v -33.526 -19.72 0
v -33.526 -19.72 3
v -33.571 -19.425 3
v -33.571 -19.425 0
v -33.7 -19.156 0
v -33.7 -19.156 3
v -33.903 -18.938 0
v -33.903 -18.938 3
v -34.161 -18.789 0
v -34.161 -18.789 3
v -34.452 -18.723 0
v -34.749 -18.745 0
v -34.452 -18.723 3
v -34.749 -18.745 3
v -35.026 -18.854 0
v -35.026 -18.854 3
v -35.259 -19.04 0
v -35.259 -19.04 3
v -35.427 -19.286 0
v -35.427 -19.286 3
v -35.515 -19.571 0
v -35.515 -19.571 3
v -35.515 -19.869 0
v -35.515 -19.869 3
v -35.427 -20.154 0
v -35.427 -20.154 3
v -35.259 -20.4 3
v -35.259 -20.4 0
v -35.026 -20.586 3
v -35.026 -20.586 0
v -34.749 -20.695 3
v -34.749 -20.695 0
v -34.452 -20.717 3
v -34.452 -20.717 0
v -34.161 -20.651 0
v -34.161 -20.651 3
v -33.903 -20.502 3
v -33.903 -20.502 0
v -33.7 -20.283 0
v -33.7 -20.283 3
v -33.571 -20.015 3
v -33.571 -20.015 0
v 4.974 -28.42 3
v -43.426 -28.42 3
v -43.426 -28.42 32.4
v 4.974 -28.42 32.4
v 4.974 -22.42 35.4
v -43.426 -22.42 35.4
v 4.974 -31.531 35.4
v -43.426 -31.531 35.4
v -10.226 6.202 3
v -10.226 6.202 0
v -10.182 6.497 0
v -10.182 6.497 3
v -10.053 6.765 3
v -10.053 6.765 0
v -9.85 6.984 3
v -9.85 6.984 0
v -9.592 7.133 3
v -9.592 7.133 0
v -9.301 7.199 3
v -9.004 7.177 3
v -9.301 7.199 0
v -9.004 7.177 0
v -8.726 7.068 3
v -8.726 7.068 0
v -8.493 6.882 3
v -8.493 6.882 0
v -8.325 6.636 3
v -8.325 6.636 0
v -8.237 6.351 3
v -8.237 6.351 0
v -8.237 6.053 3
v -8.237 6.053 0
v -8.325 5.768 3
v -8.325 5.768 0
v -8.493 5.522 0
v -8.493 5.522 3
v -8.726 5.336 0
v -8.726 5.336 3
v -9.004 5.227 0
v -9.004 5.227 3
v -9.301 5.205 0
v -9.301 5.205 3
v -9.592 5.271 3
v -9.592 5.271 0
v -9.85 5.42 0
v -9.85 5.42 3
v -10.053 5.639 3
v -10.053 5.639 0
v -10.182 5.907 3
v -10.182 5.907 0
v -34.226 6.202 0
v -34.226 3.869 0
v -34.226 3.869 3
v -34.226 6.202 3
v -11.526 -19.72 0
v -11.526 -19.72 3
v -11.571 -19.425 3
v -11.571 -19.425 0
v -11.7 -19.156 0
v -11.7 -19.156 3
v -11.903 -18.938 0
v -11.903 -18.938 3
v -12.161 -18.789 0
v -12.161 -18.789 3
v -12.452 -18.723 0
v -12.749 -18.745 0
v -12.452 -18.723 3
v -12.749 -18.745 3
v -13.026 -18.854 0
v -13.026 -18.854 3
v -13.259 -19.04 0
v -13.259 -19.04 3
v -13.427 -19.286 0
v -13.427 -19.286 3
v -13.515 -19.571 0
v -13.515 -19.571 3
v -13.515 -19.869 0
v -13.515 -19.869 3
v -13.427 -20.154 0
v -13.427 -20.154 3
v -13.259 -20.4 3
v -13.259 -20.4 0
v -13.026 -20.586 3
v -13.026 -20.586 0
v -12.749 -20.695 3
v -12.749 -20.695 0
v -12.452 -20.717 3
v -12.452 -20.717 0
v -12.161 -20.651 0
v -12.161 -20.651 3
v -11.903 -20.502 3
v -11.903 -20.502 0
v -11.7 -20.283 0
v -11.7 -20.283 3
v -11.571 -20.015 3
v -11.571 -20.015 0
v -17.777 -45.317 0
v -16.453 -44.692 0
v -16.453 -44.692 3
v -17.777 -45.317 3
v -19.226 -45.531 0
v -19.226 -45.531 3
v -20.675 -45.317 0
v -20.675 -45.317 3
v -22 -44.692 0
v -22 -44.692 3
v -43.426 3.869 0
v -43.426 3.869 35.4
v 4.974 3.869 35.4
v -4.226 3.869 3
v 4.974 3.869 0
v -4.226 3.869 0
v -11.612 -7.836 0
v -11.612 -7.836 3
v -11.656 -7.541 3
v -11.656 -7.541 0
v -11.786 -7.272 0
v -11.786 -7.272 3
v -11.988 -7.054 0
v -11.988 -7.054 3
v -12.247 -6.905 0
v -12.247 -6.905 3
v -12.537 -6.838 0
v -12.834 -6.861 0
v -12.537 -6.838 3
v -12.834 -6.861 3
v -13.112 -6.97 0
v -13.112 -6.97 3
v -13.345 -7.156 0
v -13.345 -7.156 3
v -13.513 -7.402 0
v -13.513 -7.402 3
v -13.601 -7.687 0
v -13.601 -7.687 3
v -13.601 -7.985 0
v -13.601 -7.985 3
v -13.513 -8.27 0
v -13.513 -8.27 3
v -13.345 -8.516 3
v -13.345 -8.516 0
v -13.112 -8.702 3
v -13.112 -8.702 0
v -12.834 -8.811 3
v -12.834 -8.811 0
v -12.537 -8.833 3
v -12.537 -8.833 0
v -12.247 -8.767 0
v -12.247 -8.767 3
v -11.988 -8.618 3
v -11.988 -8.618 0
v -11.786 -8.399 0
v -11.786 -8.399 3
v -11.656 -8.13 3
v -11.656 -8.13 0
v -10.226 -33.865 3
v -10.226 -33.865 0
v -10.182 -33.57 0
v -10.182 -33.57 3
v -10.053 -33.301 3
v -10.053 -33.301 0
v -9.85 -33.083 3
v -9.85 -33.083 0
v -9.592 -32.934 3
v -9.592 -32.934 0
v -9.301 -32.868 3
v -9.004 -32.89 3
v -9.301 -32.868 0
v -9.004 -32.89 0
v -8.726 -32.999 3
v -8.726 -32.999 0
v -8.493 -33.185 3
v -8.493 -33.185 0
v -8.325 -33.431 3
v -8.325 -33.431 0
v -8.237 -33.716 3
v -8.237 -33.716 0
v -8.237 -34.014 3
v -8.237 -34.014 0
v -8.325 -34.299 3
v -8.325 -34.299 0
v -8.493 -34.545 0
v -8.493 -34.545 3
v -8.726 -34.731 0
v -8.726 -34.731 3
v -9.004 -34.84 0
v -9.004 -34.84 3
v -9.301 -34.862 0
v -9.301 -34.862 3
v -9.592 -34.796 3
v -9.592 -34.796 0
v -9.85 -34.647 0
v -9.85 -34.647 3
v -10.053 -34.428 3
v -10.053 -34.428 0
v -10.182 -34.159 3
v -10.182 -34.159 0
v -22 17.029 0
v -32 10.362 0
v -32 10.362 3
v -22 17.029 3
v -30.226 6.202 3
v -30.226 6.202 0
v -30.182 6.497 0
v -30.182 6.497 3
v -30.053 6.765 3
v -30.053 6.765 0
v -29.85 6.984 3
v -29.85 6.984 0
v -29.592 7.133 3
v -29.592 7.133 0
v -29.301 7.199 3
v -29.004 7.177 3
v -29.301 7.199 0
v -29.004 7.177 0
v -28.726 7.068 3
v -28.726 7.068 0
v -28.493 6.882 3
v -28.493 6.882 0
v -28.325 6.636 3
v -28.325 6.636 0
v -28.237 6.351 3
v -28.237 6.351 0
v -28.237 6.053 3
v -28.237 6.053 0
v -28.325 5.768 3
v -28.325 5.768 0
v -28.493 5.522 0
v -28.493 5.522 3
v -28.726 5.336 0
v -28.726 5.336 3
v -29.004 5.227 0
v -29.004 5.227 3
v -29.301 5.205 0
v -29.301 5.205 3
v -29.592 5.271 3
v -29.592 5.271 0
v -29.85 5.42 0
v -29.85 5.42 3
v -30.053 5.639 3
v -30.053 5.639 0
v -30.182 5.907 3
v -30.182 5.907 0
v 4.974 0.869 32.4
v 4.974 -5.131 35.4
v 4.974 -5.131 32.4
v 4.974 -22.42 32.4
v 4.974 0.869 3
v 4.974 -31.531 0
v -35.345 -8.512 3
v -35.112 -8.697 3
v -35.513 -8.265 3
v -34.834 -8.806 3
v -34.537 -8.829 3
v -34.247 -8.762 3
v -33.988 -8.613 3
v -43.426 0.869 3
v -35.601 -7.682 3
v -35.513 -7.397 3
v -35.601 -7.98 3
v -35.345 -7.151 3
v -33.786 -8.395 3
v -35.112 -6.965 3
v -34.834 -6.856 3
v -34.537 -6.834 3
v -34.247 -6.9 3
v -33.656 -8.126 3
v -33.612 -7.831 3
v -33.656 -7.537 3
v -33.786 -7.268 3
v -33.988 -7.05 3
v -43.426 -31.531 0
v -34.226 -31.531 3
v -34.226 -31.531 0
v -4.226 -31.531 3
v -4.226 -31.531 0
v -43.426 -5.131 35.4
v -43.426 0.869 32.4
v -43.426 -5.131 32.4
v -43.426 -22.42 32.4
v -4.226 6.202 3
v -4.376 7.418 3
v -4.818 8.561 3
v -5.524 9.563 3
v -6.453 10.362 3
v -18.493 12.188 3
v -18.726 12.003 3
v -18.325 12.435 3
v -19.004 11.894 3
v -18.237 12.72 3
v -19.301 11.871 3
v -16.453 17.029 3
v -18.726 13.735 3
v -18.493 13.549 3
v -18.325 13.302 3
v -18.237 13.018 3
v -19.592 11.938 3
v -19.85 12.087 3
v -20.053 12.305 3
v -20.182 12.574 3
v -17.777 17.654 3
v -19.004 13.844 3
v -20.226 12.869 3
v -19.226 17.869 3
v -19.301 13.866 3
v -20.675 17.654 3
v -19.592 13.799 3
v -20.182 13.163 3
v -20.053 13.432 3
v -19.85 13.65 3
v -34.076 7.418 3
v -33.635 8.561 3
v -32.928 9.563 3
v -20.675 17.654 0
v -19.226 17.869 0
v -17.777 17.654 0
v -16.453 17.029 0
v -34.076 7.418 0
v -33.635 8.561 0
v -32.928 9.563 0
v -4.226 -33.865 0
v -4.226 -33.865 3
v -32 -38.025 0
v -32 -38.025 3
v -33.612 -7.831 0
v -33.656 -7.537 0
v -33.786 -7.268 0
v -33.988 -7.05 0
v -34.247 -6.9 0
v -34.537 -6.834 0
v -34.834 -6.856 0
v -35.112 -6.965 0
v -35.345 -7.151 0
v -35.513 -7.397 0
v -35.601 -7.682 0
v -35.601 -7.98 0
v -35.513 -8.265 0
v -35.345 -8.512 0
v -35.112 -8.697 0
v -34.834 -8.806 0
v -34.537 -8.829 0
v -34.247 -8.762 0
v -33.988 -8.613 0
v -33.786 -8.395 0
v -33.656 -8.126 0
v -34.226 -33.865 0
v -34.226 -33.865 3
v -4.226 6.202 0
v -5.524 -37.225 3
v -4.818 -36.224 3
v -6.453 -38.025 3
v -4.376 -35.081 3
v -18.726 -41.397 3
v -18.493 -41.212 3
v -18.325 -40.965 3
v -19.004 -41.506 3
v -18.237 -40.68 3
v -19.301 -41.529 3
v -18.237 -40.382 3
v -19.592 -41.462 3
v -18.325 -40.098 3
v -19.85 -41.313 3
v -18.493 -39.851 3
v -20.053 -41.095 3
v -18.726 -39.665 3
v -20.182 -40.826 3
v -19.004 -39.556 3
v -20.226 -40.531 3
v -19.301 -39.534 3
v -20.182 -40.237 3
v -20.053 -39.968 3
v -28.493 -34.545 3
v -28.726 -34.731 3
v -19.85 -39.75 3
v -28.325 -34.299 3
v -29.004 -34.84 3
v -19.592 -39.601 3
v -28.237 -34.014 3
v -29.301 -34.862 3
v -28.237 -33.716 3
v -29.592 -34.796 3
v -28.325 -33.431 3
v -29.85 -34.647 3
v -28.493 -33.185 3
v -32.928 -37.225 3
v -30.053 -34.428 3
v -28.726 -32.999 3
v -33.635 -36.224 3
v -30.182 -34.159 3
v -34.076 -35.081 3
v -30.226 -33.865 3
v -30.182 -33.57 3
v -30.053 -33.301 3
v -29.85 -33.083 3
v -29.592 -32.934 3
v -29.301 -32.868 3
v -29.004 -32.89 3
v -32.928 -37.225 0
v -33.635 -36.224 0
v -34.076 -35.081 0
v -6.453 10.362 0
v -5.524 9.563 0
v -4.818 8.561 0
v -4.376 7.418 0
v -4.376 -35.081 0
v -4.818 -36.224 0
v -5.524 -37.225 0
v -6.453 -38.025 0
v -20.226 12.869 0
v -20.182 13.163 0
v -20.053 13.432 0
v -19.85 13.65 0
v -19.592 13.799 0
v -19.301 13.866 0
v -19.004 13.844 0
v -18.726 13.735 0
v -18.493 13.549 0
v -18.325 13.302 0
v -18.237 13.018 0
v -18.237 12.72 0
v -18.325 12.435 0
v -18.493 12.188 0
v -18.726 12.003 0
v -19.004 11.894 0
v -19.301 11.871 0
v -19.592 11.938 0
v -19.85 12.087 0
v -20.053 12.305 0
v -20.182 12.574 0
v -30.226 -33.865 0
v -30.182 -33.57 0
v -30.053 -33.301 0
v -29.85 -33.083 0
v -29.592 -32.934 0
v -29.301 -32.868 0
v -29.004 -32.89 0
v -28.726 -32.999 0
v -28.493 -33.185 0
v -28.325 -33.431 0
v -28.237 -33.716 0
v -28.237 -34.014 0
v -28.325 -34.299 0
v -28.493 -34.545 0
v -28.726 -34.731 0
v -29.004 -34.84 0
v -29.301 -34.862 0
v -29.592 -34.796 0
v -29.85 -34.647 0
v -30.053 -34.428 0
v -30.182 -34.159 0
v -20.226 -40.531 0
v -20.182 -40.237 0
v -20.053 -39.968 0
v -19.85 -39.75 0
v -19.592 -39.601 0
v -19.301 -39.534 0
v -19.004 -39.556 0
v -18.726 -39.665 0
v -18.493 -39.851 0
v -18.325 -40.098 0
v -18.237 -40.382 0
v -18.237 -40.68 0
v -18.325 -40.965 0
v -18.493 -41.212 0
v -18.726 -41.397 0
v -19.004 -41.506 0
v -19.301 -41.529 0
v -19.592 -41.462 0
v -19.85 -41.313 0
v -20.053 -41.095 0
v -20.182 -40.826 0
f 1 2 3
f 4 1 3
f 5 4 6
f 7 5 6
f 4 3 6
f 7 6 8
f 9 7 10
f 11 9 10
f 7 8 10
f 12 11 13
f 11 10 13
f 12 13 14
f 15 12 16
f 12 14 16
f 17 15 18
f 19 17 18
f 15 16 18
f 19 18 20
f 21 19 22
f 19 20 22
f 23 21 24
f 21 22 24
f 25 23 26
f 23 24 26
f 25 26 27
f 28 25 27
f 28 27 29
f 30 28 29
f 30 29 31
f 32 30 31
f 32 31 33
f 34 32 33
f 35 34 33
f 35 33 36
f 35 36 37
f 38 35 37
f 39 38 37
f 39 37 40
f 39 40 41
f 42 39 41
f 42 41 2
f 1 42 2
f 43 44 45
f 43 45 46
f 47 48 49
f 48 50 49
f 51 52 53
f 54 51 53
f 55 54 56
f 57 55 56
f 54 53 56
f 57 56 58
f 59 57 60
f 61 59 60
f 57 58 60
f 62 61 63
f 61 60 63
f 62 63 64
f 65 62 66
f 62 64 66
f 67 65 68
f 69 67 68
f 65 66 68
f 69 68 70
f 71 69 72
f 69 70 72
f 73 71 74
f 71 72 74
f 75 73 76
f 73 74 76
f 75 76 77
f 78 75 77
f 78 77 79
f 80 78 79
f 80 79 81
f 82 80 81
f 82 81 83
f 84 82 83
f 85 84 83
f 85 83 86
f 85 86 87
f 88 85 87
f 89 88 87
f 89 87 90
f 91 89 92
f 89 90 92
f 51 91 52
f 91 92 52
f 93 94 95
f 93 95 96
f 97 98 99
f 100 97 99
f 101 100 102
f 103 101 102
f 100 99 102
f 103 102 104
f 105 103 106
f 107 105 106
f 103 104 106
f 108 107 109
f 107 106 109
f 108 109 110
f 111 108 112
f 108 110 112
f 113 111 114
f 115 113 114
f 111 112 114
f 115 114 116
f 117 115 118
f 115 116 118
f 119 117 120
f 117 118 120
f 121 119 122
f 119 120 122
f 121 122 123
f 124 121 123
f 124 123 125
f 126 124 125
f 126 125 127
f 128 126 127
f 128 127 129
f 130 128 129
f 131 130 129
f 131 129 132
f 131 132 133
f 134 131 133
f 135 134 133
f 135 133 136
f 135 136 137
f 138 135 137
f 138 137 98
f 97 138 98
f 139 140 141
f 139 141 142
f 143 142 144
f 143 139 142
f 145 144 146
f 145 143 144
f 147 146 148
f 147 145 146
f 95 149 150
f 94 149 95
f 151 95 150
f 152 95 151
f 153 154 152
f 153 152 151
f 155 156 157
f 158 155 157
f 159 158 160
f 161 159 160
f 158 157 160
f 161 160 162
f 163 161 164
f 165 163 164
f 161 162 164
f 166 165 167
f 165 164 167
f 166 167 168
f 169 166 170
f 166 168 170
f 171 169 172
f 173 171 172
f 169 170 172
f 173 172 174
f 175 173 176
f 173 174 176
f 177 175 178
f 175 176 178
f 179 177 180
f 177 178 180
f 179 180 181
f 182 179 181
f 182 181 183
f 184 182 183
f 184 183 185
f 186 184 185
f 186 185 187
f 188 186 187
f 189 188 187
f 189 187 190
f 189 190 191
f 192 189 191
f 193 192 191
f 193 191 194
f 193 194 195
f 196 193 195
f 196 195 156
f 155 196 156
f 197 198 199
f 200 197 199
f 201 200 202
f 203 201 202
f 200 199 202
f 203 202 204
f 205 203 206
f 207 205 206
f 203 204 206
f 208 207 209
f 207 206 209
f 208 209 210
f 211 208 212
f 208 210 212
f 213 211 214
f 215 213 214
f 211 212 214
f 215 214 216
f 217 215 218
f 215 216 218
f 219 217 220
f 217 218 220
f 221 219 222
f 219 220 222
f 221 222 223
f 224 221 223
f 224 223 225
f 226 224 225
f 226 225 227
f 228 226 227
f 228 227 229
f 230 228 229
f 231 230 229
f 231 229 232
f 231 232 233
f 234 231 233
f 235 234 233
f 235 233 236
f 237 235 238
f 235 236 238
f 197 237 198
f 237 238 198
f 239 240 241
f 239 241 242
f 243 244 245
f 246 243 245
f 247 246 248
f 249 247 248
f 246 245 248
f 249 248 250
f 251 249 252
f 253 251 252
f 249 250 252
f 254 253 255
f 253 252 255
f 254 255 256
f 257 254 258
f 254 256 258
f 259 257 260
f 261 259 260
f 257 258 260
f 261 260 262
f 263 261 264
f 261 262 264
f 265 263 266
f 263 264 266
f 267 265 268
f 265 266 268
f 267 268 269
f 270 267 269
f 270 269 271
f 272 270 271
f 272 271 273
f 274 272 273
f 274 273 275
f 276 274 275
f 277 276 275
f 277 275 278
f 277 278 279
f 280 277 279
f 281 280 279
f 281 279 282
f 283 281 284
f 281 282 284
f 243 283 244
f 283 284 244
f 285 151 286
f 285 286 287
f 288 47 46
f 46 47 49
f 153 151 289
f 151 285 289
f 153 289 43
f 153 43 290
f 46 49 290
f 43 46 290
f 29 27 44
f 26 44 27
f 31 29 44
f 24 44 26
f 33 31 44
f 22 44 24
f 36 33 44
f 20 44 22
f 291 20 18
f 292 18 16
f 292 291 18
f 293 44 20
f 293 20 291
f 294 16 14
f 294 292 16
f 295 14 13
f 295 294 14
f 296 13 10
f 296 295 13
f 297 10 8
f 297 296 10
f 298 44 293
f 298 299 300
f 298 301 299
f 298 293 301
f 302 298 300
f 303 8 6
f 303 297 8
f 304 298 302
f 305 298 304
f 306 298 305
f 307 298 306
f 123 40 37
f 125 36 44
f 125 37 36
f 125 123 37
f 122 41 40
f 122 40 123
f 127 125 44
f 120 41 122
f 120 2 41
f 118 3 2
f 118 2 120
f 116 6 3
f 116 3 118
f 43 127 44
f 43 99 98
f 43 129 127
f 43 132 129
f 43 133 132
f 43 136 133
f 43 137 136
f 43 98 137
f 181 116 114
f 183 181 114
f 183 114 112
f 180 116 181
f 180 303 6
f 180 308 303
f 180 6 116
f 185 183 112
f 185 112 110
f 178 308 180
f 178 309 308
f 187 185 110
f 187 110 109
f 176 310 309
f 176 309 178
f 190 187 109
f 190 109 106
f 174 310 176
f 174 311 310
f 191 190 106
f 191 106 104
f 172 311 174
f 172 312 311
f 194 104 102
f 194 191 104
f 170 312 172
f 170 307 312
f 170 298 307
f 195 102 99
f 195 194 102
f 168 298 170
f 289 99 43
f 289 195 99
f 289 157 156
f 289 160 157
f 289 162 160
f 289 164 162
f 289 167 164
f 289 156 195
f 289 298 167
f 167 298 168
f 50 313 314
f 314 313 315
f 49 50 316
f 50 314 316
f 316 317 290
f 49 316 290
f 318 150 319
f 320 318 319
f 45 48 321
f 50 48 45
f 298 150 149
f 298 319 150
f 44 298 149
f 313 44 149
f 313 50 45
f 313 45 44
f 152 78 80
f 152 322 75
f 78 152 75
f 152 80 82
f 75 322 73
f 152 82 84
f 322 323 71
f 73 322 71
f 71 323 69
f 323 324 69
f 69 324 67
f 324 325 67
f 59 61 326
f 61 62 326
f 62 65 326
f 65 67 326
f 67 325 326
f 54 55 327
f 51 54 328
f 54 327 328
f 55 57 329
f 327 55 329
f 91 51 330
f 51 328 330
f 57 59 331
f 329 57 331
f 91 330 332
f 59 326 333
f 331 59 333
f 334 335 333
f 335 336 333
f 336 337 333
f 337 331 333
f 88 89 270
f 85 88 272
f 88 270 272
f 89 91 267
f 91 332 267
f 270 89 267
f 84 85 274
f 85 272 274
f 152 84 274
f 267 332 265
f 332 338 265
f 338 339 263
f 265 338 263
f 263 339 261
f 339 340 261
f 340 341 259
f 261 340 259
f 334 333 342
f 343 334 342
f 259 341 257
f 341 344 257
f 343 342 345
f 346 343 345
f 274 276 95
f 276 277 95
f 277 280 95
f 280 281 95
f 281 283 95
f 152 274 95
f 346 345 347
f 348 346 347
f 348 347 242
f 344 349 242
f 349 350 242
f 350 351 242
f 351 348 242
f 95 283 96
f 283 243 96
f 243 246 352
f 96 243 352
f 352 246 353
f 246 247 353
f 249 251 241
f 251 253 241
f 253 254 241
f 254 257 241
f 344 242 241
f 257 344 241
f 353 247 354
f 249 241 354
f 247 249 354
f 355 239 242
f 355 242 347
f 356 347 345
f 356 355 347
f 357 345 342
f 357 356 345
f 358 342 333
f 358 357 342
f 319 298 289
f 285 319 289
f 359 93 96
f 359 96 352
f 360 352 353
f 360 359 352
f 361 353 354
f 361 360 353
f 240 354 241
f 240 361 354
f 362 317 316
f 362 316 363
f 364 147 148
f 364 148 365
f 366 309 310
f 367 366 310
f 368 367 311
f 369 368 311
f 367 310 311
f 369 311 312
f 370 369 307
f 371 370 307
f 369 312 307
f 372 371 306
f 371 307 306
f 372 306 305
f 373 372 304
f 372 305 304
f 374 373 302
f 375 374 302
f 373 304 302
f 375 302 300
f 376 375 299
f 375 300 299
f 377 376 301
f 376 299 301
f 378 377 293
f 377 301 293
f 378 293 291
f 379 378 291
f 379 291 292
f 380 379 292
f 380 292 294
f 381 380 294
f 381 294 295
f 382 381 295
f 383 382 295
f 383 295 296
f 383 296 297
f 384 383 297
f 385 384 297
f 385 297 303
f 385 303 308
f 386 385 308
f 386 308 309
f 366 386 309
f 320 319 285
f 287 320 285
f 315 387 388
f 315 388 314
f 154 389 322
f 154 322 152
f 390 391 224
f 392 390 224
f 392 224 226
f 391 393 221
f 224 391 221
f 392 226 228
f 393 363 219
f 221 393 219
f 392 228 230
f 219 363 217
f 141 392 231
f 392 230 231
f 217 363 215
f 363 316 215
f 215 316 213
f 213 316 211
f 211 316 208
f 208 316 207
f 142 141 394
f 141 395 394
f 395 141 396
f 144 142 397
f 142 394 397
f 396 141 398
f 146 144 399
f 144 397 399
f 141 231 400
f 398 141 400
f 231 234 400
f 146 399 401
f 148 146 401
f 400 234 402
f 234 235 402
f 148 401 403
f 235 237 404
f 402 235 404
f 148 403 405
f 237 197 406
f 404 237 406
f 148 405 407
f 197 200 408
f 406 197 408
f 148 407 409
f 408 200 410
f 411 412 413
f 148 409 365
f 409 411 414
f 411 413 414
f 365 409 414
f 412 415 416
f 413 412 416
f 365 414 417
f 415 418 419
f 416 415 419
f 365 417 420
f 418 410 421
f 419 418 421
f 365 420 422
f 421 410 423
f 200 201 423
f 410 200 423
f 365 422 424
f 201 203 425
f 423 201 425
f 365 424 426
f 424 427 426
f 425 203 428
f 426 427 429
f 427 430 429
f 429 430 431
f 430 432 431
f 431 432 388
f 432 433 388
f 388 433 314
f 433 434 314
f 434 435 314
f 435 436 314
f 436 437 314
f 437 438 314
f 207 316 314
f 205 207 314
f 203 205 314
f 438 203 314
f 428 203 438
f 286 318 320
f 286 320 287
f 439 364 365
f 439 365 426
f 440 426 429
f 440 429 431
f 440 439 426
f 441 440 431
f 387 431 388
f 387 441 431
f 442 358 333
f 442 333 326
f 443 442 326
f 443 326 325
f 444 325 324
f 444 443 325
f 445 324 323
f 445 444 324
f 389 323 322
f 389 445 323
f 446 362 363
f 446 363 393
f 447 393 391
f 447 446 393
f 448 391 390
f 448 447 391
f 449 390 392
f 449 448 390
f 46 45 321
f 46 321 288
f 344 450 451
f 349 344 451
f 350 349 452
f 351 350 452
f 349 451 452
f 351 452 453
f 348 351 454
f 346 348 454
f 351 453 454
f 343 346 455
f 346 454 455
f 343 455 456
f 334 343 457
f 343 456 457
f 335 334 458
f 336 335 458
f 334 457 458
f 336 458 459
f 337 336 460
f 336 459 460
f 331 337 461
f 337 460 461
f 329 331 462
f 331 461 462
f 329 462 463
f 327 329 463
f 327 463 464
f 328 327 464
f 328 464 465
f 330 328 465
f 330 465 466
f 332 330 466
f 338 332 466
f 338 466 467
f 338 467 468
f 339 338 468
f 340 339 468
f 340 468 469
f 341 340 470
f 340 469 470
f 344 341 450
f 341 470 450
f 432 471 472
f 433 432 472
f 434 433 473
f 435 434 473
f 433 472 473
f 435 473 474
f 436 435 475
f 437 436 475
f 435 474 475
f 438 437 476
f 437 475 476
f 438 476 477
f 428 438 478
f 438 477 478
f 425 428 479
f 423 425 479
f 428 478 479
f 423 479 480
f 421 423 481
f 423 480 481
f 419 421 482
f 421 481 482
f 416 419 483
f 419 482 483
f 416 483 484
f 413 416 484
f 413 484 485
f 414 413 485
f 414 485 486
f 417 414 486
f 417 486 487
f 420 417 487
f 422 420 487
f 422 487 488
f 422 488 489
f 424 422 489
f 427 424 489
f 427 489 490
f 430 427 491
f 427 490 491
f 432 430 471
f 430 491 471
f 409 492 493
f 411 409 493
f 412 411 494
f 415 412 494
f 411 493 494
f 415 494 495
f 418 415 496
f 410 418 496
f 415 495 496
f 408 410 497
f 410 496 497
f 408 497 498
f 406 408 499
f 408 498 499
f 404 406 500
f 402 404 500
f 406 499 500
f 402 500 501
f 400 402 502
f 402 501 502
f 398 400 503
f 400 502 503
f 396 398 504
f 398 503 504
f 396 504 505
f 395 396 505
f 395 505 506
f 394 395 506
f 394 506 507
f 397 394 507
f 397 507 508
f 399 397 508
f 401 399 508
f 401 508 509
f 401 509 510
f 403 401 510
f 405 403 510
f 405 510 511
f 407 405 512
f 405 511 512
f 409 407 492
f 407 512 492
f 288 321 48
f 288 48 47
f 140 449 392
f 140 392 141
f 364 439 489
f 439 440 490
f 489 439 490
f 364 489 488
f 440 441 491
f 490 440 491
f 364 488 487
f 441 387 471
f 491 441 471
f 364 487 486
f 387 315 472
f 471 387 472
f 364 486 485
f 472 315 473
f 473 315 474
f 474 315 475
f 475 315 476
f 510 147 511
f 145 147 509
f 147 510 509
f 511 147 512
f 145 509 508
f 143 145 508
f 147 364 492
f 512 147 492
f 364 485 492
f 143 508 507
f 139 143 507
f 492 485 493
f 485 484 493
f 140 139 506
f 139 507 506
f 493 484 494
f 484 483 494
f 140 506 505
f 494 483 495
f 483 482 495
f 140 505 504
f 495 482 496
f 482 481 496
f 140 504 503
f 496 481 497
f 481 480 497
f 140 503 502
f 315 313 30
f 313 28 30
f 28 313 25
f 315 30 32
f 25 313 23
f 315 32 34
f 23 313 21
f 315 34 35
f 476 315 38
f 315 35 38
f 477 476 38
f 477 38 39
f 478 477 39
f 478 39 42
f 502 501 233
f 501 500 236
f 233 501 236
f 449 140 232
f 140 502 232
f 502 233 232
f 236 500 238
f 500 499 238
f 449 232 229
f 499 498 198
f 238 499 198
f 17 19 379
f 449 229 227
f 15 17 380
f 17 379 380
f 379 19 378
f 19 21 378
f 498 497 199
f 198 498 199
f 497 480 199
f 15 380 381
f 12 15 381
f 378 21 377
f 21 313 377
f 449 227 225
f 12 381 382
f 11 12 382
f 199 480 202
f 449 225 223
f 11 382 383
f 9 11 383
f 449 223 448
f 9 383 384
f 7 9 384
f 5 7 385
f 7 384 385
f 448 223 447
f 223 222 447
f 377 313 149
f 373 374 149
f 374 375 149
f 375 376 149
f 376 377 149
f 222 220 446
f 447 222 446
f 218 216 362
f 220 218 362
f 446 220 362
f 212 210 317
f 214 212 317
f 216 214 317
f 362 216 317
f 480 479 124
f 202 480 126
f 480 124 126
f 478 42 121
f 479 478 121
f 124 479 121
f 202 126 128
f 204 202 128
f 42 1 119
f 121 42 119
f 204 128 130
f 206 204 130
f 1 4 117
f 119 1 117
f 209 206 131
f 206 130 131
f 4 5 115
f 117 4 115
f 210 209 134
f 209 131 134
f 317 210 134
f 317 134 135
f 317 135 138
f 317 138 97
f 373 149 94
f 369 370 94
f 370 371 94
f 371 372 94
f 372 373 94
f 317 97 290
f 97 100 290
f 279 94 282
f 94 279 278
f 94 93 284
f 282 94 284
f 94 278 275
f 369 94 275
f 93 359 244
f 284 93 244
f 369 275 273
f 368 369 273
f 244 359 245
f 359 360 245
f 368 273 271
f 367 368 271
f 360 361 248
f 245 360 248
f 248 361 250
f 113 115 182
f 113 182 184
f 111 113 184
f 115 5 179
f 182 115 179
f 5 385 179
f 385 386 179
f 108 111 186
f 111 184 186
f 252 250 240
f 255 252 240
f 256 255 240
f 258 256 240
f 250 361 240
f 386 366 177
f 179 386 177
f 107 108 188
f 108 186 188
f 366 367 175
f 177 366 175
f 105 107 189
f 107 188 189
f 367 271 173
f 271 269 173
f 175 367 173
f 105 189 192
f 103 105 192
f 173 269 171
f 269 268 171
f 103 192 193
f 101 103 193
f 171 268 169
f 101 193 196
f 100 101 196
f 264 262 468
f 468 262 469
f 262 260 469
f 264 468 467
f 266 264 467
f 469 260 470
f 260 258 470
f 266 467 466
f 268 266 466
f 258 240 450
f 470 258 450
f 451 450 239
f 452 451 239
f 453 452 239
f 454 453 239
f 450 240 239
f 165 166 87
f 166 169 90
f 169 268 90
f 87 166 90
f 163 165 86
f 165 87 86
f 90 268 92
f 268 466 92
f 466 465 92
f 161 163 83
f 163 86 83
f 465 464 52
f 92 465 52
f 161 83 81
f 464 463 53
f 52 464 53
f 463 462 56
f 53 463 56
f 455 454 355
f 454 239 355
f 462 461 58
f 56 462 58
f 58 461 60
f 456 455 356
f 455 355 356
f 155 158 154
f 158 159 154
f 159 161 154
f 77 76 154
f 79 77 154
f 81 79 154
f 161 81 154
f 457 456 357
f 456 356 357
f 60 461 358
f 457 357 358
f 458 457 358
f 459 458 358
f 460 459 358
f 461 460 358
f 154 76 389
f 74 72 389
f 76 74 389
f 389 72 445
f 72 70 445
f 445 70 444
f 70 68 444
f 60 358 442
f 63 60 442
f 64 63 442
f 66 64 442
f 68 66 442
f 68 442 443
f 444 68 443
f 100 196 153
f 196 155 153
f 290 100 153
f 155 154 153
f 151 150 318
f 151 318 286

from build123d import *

# Parameters (mm, degrees)
SKETCH4_W                = 48.4
SKETCH4_H                = 35.4
BOTTOM_PLATE_DEPTH       = 3
SKETCH5_W                = 48.4
SKETCH5_H                = 3
SKETCH5_H_2              = 3.111627182
SIDE_PLATE_DEPTH         = 32.4
SKETCH6_W                = 48.4
SKETCH6_H                = 3
TOP_PLATE_1_DEPTH        = 6
SKETCH7_W                = 48.4
SKETCH7_H                = 3
TOP_PLATE_2_DEPTH        = 6
CAMERA_SCREW_HOLES_REACH = 64.688
SKETCH8_R                = 1
SKETCH10_R               = 1
CASE_ATTACHMENT_1_DEPTH  = 3
SKETCH10_4_R             = 1
CASE_ATTACHMENT_2_DEPTH  = 3


with BuildPart() as part:
    # Sketch4 → Bottom_Plate (new body)
    with BuildSketch(Plane.XY):
        with Locations((-19.226323529, -13.831389527)):
            Rectangle(SKETCH4_W, SKETCH4_H)
    extrude(amount=BOTTOM_PLATE_DEPTH)

    # Sketch5 → Side_Plate (add)
    with BuildSketch(Plane.XY.offset(3)):
        with Locations((-19.226323529, 2.368610473)):
            Rectangle(SKETCH5_W, SKETCH5_H)
        with Locations((-19.226323529, -29.975575936)):
            Rectangle(SKETCH5_W, SKETCH5_H_2)
    extrude(amount=SIDE_PLATE_DEPTH)

    # Sketch6 → Top_Plate_1 (add)
    with BuildSketch(Plane.XZ.offset(-0.868610473)):
        with Locations((-19.226323529, 33.9)):
            Rectangle(SKETCH6_W, SKETCH6_H)
    extrude(amount=TOP_PLATE_1_DEPTH)

    # Sketch7 → Top_Plate_2 (add)
    with BuildSketch(Plane(origin=(0, -28.419762345, 0), x_dir=(1, 0, 0), z_dir=(0, 1, 0))):
        with Locations((-19.226323529, -33.9)):
            Rectangle(SKETCH7_W, SKETCH7_H)
    extrude(amount=TOP_PLATE_2_DEPTH)

    # Sketch8 → Camera_Screw_Holes (cut, up to next)
    with BuildSketch(Plane.XY.offset(3), mode=Mode.PRIVATE) as camera_screw_holes_sk1:
        with Locations((-34.526323529, -19.719762345)):
            Circle(SKETCH8_R)
    camera_screw_holes_tool1 = extrude(camera_screw_holes_sk1.sketch, amount=-CAMERA_SCREW_HOLES_REACH, mode=Mode.PRIVATE) & part.part
    # Sketch8 → Camera_Screw_Holes (cut, up to next)
    with BuildSketch(Plane.XY.offset(3), mode=Mode.PRIVATE) as camera_screw_holes_sk2:
        with Locations((-34.611878154, -7.831372789)):
            Circle(SKETCH8_R)
    camera_screw_holes_tool2 = extrude(camera_screw_holes_sk2.sketch, amount=-CAMERA_SCREW_HOLES_REACH, mode=Mode.PRIVATE) & part.part
    # Sketch8 → Camera_Screw_Holes (cut, up to next)
    with BuildSketch(Plane.XY.offset(3), mode=Mode.PRIVATE) as camera_screw_holes_sk3:
        with Locations((-12.611878575, -7.835676936)):
            Circle(SKETCH8_R)
    camera_screw_holes_tool3 = extrude(camera_screw_holes_sk3.sketch, amount=-CAMERA_SCREW_HOLES_REACH, mode=Mode.PRIVATE) & part.part
    # Sketch8 → Camera_Screw_Holes (cut, up to next)
    with BuildSketch(Plane.XY.offset(3), mode=Mode.PRIVATE) as camera_screw_holes_sk4:
        with Locations((-12.526323529, -19.719762345)):
            Circle(SKETCH8_R)
    camera_screw_holes_tool4 = extrude(camera_screw_holes_sk4.sketch, amount=-CAMERA_SCREW_HOLES_REACH, mode=Mode.PRIVATE) & part.part
    add(camera_screw_holes_tool1.solids().sort_by_distance((-34.526324, -19.719762, 3))[0], mode=Mode.SUBTRACT)
    add(camera_screw_holes_tool2.solids().sort_by_distance((-34.611878, -7.831373, 3))[0], mode=Mode.SUBTRACT)
    add(camera_screw_holes_tool3.solids().sort_by_distance((-12.611879, -7.835677, 3))[0], mode=Mode.SUBTRACT)
    add(camera_screw_holes_tool4.solids().sort_by_distance((-12.526324, -19.719762, 3))[0], mode=Mode.SUBTRACT)

    # Sketch10 → Case_Attachment_1 (add)
    with BuildSketch(Plane(origin=(0, 0, 0), x_dir=(-1, 0, 0), z_dir=(0, 0, -1))):
        with BuildLine():
            Line((4.226323529, 6.201943806), (4.226323529, 3.868610473))
            Line((4.226323529, 3.868610473), (34.226323529, 3.868610473))
            Line((34.226323529, 3.868610473), (34.226323529, 6.201943806))
            ThreePointArc((34.226323529, 6.201943806), (33.634696523, 8.561233434), (31.99982451, 10.362195278))
            Line((31.99982451, 10.362195278), (21.99982451, 17.028861945))
            ThreePointArc((21.99982451, 17.028861945), (19.226323529, 17.868610473), (16.452822548, 17.028861945))
            Line((16.452822548, 17.028861945), (6.452822548, 10.362195278))
            ThreePointArc((6.452822548, 10.362195278), (4.817950535, 8.561233434), (4.226323529, 6.201943806))
        make_face()
        with Locations((9.226323529, 6.201943806)):
            Circle(SKETCH10_R, mode=Mode.SUBTRACT)
        with Locations((29.226323529, 6.201943806)):
            Circle(SKETCH10_R, mode=Mode.SUBTRACT)
        with Locations((19.226323529, 12.868610473)):
            Circle(SKETCH10_R, mode=Mode.SUBTRACT)
    extrude(amount=-CASE_ATTACHMENT_1_DEPTH)

    # Sketch10<4> → Case_Attachment_2 (add)
    with BuildSketch(Plane(origin=(0, 0, 0), x_dir=(-1, 0, 0), z_dir=(0, 0, -1))):
        with BuildLine():
            ThreePointArc((4.226323529, -33.86472286), (4.817950535, -36.224012488), (6.452822548, -38.024974332))
            Line((6.452822548, -38.024974332), (16.452822548, -44.691640999))
            ThreePointArc((16.452822548, -44.691640999), (19.226323529, -45.531389527), (21.99982451, -44.691640999))
            Line((21.99982451, -44.691640999), (31.99982451, -38.024974332))
            ThreePointArc((31.99982451, -38.024974332), (33.634696523, -36.224012488), (34.226323529, -33.86472286))
            Line((34.226323529, -33.86472286), (34.226323529, -31.531389527))
            Line((34.226323529, -31.531389527), (4.226323529, -31.531389527))
            Line((4.226323529, -31.531389527), (4.226323529, -33.86472286))
        make_face()
        with Locations((9.226323529, -33.86472286)):
            Circle(SKETCH10_4_R, mode=Mode.SUBTRACT)
        with Locations((19.226323529, -40.531389527)):
            Circle(SKETCH10_4_R, mode=Mode.SUBTRACT)
        with Locations((29.226323529, -33.86472286)):
            Circle(SKETCH10_4_R, mode=Mode.SUBTRACT)
    extrude(amount=-CASE_ATTACHMENT_2_DEPTH)


solid = part.part
